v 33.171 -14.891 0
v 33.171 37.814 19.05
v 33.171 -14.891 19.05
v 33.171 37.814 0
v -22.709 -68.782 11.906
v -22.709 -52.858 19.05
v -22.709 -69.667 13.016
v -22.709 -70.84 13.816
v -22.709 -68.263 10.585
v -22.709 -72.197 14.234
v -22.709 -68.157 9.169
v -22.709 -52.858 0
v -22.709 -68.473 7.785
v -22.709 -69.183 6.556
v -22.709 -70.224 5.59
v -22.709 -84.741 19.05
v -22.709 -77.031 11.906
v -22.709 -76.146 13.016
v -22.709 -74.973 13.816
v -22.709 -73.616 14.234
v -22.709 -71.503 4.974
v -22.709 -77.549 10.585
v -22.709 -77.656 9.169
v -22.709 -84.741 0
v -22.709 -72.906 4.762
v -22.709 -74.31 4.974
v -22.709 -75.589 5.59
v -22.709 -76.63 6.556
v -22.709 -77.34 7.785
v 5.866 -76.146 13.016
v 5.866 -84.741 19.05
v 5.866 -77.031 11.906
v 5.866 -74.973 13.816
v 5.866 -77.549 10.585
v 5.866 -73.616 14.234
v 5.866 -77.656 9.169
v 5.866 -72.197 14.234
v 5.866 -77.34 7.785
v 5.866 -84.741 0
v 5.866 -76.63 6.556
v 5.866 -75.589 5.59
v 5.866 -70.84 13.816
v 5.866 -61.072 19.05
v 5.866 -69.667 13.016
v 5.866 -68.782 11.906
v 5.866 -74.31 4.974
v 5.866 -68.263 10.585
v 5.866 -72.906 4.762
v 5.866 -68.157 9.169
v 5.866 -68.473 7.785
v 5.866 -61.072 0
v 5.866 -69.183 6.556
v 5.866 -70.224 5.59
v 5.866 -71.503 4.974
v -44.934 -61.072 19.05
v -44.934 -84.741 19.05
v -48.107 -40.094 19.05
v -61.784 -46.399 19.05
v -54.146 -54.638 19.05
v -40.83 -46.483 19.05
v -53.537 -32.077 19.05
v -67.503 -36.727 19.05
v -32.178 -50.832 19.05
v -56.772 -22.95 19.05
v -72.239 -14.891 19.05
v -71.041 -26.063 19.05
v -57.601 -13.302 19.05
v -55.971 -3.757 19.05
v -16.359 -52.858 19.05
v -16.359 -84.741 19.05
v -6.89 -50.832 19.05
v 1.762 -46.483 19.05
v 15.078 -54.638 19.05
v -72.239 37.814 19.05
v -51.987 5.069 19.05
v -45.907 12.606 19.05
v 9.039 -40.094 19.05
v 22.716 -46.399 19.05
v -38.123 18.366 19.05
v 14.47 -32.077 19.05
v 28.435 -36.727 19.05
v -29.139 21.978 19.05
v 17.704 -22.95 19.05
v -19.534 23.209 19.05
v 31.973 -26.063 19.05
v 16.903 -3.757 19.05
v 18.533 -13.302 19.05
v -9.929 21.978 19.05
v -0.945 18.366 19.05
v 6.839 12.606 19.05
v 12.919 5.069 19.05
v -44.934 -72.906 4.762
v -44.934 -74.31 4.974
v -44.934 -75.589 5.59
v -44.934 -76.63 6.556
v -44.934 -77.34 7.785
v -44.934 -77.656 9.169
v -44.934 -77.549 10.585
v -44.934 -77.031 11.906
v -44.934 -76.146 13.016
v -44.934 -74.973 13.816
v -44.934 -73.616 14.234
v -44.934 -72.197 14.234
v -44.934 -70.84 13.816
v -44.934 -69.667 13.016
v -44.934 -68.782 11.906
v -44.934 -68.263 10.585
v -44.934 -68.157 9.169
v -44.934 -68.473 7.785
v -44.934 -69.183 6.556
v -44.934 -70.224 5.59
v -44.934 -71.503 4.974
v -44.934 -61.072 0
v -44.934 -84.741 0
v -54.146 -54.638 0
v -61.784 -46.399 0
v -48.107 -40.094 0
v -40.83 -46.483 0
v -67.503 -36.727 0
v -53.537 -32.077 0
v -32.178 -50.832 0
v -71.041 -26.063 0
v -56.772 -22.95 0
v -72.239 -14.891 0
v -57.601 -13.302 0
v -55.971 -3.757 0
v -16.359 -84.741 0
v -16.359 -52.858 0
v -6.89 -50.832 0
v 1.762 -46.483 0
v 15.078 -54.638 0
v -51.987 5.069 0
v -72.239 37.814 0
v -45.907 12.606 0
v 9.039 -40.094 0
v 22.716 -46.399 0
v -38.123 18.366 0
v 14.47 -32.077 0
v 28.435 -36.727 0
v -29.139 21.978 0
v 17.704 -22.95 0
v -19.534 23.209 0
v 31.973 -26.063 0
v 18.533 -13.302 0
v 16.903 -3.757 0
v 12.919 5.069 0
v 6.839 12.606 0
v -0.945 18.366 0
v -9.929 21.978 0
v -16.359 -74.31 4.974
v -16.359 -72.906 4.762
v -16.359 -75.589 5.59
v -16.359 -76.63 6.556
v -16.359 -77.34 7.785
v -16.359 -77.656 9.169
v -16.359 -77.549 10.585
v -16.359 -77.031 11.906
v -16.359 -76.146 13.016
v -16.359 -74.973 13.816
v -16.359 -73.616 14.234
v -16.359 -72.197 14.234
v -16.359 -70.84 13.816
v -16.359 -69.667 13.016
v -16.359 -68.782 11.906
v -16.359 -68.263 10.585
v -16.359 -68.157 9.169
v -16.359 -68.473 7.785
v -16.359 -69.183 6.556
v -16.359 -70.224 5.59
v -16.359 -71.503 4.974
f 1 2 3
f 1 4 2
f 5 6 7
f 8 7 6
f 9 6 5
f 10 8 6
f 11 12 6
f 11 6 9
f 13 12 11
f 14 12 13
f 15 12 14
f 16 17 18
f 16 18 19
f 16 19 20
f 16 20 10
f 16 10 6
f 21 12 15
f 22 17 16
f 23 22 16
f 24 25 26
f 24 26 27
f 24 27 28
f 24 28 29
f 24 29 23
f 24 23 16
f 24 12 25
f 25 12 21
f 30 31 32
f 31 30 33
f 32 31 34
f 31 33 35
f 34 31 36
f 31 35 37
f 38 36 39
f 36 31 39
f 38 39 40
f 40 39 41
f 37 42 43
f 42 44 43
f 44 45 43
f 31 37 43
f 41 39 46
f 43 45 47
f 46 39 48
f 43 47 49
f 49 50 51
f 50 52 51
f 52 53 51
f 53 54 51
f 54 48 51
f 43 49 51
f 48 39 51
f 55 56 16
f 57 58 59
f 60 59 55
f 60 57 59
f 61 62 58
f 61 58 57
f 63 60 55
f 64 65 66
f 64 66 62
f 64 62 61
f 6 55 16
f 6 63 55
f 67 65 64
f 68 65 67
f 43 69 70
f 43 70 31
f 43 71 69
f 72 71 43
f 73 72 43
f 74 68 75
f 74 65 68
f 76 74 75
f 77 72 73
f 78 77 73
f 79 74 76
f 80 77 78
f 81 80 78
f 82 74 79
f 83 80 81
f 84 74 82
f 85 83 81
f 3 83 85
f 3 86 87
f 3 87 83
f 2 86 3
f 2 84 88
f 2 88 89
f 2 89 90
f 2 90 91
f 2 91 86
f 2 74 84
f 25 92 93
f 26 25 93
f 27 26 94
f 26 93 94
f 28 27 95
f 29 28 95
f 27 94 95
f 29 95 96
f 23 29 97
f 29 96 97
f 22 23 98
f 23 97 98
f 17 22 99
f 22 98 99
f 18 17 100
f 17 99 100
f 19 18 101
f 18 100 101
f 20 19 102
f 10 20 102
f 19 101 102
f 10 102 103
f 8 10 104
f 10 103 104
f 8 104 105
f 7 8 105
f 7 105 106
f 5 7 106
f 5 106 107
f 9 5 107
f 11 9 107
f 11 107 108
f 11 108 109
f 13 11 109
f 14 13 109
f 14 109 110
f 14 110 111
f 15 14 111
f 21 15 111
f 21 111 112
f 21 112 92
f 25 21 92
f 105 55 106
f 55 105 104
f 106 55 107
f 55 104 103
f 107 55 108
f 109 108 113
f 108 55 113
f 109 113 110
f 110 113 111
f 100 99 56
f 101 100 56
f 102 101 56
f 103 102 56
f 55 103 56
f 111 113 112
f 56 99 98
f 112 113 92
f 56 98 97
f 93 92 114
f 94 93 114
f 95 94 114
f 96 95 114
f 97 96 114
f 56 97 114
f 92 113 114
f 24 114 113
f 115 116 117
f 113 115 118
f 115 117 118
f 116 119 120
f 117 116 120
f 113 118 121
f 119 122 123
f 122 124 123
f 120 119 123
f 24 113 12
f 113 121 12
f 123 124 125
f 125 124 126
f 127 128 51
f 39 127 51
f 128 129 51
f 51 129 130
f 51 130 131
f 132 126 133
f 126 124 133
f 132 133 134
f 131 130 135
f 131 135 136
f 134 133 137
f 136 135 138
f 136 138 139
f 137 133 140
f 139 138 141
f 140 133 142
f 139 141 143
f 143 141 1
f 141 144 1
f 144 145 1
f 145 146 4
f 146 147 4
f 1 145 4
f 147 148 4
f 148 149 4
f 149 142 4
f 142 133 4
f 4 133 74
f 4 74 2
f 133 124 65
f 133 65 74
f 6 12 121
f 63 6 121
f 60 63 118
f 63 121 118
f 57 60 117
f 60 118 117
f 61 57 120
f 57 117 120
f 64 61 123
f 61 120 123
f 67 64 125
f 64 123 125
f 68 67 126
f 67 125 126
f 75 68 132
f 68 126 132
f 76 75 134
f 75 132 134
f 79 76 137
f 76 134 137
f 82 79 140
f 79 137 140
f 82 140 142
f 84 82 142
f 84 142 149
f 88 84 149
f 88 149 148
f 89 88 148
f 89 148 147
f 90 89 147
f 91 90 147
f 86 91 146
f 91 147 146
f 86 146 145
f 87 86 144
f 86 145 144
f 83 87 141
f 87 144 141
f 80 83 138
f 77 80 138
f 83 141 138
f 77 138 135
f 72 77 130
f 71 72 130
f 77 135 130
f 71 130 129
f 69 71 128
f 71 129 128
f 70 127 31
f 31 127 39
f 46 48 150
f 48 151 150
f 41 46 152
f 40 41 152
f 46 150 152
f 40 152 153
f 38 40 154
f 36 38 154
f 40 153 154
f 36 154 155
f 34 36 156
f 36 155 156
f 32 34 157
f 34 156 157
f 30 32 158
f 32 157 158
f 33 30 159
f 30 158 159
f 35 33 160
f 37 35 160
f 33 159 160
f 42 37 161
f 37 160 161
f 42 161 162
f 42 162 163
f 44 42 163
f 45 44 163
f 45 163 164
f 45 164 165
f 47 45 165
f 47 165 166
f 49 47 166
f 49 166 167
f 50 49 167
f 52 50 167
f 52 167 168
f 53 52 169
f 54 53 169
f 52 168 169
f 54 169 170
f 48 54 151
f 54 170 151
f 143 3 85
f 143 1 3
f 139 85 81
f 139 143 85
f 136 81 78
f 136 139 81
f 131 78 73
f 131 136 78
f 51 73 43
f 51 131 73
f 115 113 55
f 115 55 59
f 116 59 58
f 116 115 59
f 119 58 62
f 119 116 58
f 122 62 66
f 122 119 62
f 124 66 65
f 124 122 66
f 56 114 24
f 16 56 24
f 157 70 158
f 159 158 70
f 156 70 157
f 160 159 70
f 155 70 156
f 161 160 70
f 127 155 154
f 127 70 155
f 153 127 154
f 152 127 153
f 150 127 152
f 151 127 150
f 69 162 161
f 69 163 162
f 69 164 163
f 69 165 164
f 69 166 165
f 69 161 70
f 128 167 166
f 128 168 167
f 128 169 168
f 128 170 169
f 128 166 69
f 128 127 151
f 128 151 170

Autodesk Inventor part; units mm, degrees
ref_plane "YZ Plane" through (0, 0, 0) normal (1, 0, 0) x (0, 1, 0)
ref_plane "XZ Plane" through (0, 0, 0) normal (0, 1, 0) x (-1, 0, 0)
ref_plane "XY Plane" through (0, 0, 0) normal (0, 0, 1) x (1, 0, 0)
sketch "Sketch1" plane through (0, 0, 0) normal (0, 0, 1) x (1, 0, 0)
  line L0 (-72.2389, 37.814) -> (33.1711, 37.814)
  line L1 (33.1711, 37.814) -> (33.1711, 28.0212)
  line L2 (33.1711, 28.0212) -> (-72.2389, 28.0212)
  line L3 (-72.2389, 28.0212) -> (-72.2389, 37.814)
  circle A0 centre (-19.5339, -14.891) radius 38.1
  circle A1 centre (-19.5339, -14.891) radius 52.705
  line L4 (-72.2389, -14.891) -> (-72.2389, 28.0212)
  line L5 (33.1711, 28.0212) -> (33.1711, -14.891)
  line L6 (-44.9339, -61.0717) -> (-44.9339, -84.741)
  line L7 (-44.9339, -84.741) -> (5.8661, -84.741)
  line L8 (5.8661, -84.741) -> (5.8661, -61.0717)
  line L9 (-22.7089, -52.8585) -> (-22.7089, -84.741)
  line L10 (-16.3589, -84.741) -> (-16.3589, -52.8585)
  point P0 (0, 0)
  dimension "d0" = 105.41
  dimension "d1" = 105.41
  dimension "d2" = 76.2
  dimension "d3" = 52.705
  dimension "d4" = 25.4
  dimension "d5" = 25.4
  dimension "d6" = 69.85
  dimension "d7" = 22.225
  dimension "d8" = 22.225
extrude "Extrusion1" add sketch "Sketch1" along normal blind 19.05 contours L0 A1 L2 L3 | L0 L1 L2 A1 | A1 L2 | A1 L10 A0 L9 L2 | A1 L9 L7 L6 | L8 L7 L10 A1
sketch "Sketch2" plane through (0, 0, 19.05) normal (0, 0, 1) x (1, 0, 0)
  line L0 (-50.1339, 28.0212) -> (-72.2389, 28.0212) projected
  arc A0 (-50.1339, 28.0212) -> (-44.9339, -61.0717) centre (-19.5339, -14.891) ccw projected
  arc A1 (5.8661, -61.0717) -> (11.0661, 28.0212) centre (-19.5339, -14.891) ccw projected
  line L1 (33.1711, 28.0212) -> (11.0661, 28.0212) projected
  line L2 (33.1711, 37.814) -> (33.1711, 28.0212) projected
  line L3 (-72.2389, 28.0212) -> (-72.2389, -14.891)
  line L4 (33.1711, 28.0212) -> (33.1711, -14.891)
  point P0 (0, 0)
extrude "Extrusion2" add sketch "Sketch2" against normal blind 19.05
sketch "Sketch3" plane through (5.8661, -84.741, 0) normal (1, 0, 0) x (0, 0, -1)
  point P0 (0, 84.741)
  point P1 (-9.525, 11.8347)
hole "Hole1" at (5.8661, -72.9064, 9.525) direction (-1, 0, 0) diameter 9.525 end through all
properties part number "Router mount"
